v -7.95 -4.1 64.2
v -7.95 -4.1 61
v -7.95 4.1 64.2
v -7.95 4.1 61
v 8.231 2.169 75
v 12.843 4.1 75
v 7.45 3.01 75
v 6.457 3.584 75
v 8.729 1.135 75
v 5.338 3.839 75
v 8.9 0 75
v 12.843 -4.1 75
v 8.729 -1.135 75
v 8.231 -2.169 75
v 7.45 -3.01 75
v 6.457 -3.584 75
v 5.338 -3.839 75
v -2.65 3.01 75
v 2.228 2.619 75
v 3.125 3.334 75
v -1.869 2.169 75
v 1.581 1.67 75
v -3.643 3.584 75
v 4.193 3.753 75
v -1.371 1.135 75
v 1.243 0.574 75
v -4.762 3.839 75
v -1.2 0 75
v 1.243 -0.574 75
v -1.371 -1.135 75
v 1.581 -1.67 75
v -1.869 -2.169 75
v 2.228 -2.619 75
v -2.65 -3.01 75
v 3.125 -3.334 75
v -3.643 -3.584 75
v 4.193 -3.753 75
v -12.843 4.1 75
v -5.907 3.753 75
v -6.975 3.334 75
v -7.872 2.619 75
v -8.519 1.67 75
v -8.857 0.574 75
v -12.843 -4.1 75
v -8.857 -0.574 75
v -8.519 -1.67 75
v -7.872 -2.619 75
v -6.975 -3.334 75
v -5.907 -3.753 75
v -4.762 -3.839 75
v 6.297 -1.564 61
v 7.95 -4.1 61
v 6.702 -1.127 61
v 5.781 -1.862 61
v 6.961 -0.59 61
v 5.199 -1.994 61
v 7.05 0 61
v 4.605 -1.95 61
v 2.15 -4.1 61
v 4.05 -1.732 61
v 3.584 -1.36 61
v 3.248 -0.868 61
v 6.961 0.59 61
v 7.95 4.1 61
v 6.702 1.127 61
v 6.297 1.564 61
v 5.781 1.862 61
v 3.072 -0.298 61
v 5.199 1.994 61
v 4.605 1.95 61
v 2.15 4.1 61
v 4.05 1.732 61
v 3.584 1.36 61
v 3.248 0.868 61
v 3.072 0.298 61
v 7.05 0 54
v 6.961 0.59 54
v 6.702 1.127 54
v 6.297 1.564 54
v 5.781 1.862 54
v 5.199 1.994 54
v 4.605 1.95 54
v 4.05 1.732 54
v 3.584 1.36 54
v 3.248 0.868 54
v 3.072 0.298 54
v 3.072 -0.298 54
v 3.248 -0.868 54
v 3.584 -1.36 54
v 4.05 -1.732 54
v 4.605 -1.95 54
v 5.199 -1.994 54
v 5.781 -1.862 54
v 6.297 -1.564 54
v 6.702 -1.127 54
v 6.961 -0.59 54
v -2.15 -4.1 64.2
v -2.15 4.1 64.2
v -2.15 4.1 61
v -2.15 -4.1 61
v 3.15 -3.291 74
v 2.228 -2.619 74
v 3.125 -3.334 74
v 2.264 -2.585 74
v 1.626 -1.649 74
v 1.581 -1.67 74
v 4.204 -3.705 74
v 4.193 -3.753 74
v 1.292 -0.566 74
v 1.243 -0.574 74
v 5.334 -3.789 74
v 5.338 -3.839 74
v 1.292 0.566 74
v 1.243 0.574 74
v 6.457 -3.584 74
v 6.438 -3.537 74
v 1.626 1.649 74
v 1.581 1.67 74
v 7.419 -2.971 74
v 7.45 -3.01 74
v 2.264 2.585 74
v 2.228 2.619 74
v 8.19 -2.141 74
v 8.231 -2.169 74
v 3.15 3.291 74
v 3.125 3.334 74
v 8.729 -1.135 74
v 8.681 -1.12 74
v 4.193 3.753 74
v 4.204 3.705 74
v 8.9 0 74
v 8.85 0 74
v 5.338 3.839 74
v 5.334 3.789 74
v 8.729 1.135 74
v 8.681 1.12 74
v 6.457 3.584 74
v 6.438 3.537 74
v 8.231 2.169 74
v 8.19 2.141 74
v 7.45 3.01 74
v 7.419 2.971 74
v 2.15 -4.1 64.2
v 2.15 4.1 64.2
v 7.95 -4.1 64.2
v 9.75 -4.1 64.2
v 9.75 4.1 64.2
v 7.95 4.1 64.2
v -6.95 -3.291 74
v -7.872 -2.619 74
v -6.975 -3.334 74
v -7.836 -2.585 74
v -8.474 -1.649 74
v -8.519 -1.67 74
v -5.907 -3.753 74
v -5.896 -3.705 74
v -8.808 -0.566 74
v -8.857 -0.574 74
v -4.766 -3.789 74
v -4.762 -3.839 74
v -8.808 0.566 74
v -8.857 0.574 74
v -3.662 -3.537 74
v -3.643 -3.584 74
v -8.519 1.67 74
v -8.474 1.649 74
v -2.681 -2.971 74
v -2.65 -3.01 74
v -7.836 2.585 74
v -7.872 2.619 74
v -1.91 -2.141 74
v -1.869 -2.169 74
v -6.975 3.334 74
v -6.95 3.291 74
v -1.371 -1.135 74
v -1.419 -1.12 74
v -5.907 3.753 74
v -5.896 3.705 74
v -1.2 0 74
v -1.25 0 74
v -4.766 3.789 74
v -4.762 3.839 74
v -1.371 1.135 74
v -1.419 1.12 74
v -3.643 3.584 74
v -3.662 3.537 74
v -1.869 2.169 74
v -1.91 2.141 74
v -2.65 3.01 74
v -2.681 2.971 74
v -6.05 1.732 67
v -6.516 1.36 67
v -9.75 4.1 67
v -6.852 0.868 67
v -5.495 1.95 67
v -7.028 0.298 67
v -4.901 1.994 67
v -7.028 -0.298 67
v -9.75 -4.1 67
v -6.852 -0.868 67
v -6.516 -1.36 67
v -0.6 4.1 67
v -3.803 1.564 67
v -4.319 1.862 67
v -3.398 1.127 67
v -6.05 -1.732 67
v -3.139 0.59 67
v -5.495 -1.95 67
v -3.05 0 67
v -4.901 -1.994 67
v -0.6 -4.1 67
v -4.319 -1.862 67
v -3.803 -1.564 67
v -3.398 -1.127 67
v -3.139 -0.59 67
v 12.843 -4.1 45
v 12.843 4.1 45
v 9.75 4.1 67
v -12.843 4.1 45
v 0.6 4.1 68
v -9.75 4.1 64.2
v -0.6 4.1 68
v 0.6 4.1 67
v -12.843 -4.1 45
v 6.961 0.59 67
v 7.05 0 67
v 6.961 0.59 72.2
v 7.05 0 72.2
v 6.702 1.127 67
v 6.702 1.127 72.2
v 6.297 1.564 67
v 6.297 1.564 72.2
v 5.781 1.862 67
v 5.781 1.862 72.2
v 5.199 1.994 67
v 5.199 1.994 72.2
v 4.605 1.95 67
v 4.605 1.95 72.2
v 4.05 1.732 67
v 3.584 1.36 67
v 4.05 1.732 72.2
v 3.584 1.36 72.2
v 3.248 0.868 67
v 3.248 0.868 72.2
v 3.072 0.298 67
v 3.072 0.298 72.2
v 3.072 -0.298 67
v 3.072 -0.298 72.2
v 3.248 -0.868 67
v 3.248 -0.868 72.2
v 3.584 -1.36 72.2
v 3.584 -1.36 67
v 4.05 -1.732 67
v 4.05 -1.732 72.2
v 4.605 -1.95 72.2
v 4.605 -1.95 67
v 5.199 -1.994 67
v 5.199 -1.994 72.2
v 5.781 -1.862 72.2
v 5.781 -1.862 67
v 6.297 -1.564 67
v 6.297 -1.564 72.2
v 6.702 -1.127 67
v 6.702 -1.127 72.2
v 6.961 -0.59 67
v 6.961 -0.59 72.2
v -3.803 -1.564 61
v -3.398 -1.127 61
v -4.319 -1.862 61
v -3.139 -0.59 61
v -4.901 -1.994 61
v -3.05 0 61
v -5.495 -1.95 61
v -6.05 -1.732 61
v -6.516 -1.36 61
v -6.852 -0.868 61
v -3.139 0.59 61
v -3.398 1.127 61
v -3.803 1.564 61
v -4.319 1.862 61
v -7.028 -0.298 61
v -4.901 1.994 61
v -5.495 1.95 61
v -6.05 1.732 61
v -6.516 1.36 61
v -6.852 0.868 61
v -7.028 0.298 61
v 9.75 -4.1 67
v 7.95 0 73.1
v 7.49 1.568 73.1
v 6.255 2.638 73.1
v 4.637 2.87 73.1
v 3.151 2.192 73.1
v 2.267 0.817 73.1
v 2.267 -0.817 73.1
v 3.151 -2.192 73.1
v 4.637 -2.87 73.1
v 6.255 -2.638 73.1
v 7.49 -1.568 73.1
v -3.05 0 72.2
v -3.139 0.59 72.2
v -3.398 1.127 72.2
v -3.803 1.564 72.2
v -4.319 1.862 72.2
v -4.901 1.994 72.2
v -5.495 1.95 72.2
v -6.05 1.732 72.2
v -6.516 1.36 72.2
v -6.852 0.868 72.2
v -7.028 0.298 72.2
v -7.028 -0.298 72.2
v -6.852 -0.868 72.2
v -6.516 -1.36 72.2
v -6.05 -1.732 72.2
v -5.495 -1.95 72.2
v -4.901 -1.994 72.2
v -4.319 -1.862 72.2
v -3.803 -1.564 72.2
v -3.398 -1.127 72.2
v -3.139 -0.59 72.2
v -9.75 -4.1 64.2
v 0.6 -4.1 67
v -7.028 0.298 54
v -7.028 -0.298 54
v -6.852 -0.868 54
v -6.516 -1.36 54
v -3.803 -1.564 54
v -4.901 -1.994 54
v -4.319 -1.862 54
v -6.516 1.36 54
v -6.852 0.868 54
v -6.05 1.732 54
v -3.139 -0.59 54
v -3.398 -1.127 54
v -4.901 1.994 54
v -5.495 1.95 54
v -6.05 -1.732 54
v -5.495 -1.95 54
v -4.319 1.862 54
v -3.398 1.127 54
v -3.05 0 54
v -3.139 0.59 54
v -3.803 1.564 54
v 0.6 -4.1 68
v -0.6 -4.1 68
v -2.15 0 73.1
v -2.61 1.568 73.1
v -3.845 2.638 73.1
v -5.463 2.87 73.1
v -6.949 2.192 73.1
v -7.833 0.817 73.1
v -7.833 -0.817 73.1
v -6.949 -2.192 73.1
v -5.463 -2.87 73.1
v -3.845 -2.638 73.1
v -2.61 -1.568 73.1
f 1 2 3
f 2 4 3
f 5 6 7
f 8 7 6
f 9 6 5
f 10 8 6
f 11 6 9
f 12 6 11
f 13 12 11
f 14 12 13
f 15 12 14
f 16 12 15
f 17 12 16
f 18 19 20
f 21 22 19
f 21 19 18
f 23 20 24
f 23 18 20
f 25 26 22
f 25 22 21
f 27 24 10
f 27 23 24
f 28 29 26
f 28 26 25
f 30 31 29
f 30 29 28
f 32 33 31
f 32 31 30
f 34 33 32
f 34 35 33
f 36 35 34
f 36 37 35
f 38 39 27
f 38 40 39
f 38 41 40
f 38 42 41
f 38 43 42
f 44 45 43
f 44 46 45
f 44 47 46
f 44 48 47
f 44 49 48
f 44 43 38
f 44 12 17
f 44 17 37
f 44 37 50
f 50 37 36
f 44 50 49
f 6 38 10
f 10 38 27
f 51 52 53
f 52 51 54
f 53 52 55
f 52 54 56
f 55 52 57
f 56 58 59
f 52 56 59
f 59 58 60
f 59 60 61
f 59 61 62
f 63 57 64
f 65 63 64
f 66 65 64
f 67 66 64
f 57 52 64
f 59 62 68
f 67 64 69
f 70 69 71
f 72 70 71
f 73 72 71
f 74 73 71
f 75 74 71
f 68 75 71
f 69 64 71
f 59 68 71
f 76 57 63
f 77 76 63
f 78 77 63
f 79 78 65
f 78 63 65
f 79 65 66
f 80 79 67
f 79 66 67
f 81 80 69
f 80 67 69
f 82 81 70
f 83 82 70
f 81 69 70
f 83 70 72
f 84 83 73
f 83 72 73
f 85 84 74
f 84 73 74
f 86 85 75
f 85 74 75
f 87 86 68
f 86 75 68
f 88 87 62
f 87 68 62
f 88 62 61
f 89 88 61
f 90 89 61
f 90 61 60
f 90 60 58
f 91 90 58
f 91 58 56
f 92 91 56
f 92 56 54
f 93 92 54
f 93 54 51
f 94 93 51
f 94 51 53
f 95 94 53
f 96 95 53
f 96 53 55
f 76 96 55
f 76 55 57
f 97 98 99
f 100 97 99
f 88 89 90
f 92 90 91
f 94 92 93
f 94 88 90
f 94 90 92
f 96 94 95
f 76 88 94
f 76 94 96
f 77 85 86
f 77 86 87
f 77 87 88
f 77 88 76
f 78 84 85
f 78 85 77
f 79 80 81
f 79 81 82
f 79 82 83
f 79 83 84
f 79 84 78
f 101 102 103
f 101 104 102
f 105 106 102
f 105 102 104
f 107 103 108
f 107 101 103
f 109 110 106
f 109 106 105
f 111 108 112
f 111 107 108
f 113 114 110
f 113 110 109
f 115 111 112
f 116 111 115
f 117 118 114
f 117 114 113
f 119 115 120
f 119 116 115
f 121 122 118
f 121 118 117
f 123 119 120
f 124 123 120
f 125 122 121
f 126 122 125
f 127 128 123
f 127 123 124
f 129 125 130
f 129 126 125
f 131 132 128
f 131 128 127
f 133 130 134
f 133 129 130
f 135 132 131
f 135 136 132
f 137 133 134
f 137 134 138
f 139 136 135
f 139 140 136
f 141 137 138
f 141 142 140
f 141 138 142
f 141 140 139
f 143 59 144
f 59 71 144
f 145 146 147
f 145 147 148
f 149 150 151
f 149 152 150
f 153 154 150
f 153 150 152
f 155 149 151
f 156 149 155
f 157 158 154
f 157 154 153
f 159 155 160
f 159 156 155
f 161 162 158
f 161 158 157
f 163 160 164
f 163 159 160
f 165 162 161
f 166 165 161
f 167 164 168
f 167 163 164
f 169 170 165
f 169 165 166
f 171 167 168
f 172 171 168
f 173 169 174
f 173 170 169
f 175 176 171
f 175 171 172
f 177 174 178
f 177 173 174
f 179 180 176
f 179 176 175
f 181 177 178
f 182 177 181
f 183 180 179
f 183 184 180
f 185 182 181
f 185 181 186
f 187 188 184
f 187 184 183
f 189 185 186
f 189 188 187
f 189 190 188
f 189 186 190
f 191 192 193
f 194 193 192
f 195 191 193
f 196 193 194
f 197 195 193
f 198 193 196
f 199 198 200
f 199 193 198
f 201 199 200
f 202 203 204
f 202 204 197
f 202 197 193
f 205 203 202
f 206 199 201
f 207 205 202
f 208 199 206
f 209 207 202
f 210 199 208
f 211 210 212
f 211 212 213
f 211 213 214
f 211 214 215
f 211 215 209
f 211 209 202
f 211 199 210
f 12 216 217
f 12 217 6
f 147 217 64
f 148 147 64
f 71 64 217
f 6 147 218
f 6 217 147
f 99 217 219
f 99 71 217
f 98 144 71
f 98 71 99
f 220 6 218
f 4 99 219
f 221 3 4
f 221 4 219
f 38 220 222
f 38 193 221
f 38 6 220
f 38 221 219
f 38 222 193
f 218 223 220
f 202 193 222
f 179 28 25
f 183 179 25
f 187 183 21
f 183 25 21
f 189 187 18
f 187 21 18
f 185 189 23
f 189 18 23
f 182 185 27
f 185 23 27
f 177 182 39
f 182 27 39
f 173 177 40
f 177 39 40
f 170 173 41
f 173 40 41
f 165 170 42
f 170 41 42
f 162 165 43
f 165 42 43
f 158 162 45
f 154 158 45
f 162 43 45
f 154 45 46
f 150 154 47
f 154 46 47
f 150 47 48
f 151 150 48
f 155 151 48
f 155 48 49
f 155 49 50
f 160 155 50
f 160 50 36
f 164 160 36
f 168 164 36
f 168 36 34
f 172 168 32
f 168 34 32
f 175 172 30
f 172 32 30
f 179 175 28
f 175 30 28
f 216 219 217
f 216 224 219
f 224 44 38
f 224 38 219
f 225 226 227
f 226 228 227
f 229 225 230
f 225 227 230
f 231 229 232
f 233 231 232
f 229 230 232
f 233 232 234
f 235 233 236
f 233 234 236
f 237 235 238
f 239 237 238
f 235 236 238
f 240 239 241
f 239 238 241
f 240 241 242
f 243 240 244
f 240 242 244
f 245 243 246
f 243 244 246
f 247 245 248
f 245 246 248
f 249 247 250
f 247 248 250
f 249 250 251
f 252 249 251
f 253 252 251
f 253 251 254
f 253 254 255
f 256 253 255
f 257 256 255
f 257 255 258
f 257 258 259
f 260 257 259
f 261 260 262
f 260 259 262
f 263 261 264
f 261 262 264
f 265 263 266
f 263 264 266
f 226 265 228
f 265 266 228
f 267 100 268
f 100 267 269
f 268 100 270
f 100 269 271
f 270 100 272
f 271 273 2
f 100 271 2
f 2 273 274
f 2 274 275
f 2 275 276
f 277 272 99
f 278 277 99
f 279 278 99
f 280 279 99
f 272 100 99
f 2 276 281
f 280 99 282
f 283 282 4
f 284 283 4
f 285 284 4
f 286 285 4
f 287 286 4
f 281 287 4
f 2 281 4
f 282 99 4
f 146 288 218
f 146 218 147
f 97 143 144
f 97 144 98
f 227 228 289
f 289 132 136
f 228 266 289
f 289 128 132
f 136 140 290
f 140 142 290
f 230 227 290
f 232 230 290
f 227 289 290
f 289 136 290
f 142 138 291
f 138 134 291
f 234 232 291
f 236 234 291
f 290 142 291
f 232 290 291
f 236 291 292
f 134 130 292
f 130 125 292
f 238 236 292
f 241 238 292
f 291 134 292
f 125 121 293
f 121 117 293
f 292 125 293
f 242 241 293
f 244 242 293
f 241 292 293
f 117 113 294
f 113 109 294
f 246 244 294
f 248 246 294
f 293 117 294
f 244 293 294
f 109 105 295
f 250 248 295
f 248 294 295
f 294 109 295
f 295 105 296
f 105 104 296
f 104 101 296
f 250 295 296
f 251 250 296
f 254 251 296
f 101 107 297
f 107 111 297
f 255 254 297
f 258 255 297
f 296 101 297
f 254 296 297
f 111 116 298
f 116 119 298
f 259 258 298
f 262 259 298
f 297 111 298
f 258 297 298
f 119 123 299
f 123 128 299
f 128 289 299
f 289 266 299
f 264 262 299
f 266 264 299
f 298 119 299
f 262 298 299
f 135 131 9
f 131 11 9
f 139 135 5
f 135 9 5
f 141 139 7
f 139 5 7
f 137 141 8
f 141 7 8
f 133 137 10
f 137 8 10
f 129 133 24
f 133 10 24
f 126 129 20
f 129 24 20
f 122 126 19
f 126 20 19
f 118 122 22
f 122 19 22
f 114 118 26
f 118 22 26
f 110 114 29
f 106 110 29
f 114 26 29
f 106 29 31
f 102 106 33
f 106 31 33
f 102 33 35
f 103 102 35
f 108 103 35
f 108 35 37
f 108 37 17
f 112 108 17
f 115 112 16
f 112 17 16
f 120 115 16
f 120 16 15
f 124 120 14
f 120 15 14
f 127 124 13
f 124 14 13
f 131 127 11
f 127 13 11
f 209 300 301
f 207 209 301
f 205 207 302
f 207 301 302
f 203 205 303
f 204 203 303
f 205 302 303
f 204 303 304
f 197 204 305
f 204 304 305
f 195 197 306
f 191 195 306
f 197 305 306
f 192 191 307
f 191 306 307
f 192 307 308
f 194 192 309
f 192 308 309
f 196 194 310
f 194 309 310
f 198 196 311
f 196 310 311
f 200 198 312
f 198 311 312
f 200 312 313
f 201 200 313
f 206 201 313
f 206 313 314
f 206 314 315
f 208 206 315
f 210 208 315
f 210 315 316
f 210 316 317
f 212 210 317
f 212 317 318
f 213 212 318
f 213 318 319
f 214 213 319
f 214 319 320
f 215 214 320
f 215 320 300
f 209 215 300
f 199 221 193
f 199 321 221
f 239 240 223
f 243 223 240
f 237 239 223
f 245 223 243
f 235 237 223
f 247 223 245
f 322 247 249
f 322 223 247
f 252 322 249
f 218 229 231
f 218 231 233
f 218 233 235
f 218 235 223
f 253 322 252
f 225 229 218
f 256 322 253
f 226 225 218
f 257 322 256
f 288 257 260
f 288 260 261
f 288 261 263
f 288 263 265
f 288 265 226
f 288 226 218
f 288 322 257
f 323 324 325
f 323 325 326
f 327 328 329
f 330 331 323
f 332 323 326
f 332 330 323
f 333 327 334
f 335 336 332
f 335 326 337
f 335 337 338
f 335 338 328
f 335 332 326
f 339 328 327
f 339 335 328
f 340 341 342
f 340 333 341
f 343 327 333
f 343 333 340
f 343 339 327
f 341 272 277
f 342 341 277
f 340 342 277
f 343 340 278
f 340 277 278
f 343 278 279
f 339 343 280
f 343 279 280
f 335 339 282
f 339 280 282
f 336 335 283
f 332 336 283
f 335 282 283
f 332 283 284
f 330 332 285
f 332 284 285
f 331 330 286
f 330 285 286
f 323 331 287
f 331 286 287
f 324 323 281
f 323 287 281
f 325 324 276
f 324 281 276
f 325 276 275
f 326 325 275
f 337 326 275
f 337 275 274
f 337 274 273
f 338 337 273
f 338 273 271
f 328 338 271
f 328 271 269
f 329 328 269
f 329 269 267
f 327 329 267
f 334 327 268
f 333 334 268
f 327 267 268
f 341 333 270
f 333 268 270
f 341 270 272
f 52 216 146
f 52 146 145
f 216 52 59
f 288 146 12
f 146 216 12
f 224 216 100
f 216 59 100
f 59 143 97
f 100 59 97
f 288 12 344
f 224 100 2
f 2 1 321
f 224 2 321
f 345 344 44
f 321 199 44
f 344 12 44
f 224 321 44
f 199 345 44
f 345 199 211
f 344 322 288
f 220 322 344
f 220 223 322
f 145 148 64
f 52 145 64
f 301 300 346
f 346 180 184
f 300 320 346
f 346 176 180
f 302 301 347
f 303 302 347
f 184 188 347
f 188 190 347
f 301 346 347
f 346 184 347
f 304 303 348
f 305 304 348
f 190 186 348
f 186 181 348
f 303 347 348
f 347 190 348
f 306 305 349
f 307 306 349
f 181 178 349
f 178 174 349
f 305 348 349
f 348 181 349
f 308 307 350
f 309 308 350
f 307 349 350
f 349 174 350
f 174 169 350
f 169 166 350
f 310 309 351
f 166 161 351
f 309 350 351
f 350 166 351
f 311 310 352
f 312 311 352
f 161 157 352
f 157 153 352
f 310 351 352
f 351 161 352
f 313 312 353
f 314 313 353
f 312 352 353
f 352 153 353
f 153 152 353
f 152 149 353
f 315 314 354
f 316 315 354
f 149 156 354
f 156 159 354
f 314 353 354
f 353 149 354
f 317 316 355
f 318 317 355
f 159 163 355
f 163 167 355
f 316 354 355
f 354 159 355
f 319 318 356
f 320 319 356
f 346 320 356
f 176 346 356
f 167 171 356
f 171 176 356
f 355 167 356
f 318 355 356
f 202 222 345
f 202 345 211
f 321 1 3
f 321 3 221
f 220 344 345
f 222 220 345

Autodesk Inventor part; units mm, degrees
ref_plane "YZ Plane" through (0, 0, 0) normal (1, 0, 0) x (0, 1, 0)
ref_plane "XZ Plane" through (0, 0, 0) normal (0, 1, 0) x (-1, 0, 0)
ref_plane "XY Plane" through (0, 0, 0) normal (0, 0, 1) x (1, 0, 0)
sketch "Esquisse1" plane through (0, 0, 0) normal (0, 1, 0) x (-1, 0, 0)
  line L0 (12.8426, 45) -> (-12.8426, 45)
  line L1 (-12.8426, 45) -> (-12.8426, 75)
  line L2 (-12.8426, 75) -> (12.8426, 75)
  line L3 (12.8426, 75) -> (12.8426, 45)
  line L4 (9.75, 67) -> (-9.75, 67)
  line L5 (-9.75, 67) -> (-9.75, 64.2)
  line L6 (-9.75, 64.2) -> (9.75, 64.2)
  line L7 (9.75, 64.2) -> (9.75, 67)
  line L8 (0, -15) -> (0, 90) projected
  point P0 (0, 0)
  point P1 (0, 64.2)
  point P2 (0, 45)
  dimension "d0" = 75
  dimension "d1" = 19.5
  dimension "d2" = 2.8
  dimension "d3" = 8
  dimension "d45" = 30
  dimension "d46" = 25.6852
extrude "Extrusion1" add sketch "Esquisse1" along normal mid plane 8.2 contours L0 L8 L6 L7 L4 L2 L3 | L0 L1 L2 L8 L4 L5 L6
sketch "Esquisse2" plane through (-12.8426, -4.1, 75) normal (0, 0, 1) x (1, 0, 0)
  circle A0 centre (17.8926, 4.1) radius 3.85
  circle A1 centre (7.7926, 4.1) radius 3.85
  line L0 (17.8926, 4.1) -> (7.7926, 4.1) construction
  line L1 (12.8426, -1.64) -> (12.8426, 9.84) construction
  point P0 (12.8426, 4.1)
  dimension "d6" = 7.7
  dimension "d7" = 10.1
extrude "Extrusion2" cut sketch "Esquisse2" against normal blind 1
sketch "Esquisse3" plane through (-12.8426, -4.1, 74) normal (0, 0, 1) x (1, 0, 0)
  circle A0 centre (7.7926, 4.1) radius 3.85 projected
  circle A1 centre (7.7926, 4.1) radius 2
  circle A2 centre (17.8926, 4.1) radius 3.85 projected
  circle A3 centre (17.8926, 4.1) radius 2
  point P0 (12.8426, 4.1)
  point P1 (9.3965, 7)
  point P2 (9.3965, 0)
  point P3 (16.2887, 0)
  point P4 (16.2887, 7)
  dimension "d10" = 4
  dimension "d11" = 4
extrude "Extrusion3" cut sketch "Esquisse3" against normal blind 20 contours A1 | A3
chamfer "Chanfrein1" distance 1.8 angle 45 2 edges at (-7.05, 0, 74) (3.05, 0, 74)
sketch "Esquisse5" plane through (0, 4.1, 0) normal (0, 1, 0) x (1, 0, 0)
  line L0 (-9.75, -64.2) -> (9.75, -64.2) projected
  line L1 (-7.95, -64.2) -> (-2.15, -64.2)
  line L2 (-2.15, -64.2) -> (-2.15, -61)
  line L3 (-2.15, -61) -> (-7.95, -61)
  line L4 (-7.95, -61) -> (-7.95, -64.2)
  line L5 (2.15, -64.2) -> (7.95, -64.2)
  line L6 (7.95, -64.2) -> (7.95, -61)
  line L7 (7.95, -61) -> (2.15, -61)
  line L8 (2.15, -61) -> (2.15, -64.2)
  line L9 (5.05, 15) -> (5.05, -90) projected
  line L10 (-5.05, 15) -> (-5.05, -90) projected
  line L11 (9.75, -67) -> (-9.75, -67) projected
  line L12 (-0.6, -67) -> (0.6, -67)
  line L13 (0.6, -67) -> (0.6, -68)
  line L14 (0.6, -68) -> (-0.6, -68)
  line L15 (-0.6, -68) -> (-0.6, -67)
  point P0 (0, 0)
  point P1 (5.05, -64.2)
  point P2 (-5.05, -64.2)
  point P3 (0, -67)
  dimension "d17" = 5.8
  dimension "d18" = 3.2
  dimension "d19" = 3.2
  dimension "d22" = 1.2
  dimension "d24" = 1
extrude "Extrusion4" cut sketch "Esquisse5" against normal blind 20 contours L0 L10 L3 L2 | L8 L7 L9 L0 | L0 L4 L3 L10 | L9 L7 L6 L0 | L11 L13 L14 L15
properties part number "base1"
